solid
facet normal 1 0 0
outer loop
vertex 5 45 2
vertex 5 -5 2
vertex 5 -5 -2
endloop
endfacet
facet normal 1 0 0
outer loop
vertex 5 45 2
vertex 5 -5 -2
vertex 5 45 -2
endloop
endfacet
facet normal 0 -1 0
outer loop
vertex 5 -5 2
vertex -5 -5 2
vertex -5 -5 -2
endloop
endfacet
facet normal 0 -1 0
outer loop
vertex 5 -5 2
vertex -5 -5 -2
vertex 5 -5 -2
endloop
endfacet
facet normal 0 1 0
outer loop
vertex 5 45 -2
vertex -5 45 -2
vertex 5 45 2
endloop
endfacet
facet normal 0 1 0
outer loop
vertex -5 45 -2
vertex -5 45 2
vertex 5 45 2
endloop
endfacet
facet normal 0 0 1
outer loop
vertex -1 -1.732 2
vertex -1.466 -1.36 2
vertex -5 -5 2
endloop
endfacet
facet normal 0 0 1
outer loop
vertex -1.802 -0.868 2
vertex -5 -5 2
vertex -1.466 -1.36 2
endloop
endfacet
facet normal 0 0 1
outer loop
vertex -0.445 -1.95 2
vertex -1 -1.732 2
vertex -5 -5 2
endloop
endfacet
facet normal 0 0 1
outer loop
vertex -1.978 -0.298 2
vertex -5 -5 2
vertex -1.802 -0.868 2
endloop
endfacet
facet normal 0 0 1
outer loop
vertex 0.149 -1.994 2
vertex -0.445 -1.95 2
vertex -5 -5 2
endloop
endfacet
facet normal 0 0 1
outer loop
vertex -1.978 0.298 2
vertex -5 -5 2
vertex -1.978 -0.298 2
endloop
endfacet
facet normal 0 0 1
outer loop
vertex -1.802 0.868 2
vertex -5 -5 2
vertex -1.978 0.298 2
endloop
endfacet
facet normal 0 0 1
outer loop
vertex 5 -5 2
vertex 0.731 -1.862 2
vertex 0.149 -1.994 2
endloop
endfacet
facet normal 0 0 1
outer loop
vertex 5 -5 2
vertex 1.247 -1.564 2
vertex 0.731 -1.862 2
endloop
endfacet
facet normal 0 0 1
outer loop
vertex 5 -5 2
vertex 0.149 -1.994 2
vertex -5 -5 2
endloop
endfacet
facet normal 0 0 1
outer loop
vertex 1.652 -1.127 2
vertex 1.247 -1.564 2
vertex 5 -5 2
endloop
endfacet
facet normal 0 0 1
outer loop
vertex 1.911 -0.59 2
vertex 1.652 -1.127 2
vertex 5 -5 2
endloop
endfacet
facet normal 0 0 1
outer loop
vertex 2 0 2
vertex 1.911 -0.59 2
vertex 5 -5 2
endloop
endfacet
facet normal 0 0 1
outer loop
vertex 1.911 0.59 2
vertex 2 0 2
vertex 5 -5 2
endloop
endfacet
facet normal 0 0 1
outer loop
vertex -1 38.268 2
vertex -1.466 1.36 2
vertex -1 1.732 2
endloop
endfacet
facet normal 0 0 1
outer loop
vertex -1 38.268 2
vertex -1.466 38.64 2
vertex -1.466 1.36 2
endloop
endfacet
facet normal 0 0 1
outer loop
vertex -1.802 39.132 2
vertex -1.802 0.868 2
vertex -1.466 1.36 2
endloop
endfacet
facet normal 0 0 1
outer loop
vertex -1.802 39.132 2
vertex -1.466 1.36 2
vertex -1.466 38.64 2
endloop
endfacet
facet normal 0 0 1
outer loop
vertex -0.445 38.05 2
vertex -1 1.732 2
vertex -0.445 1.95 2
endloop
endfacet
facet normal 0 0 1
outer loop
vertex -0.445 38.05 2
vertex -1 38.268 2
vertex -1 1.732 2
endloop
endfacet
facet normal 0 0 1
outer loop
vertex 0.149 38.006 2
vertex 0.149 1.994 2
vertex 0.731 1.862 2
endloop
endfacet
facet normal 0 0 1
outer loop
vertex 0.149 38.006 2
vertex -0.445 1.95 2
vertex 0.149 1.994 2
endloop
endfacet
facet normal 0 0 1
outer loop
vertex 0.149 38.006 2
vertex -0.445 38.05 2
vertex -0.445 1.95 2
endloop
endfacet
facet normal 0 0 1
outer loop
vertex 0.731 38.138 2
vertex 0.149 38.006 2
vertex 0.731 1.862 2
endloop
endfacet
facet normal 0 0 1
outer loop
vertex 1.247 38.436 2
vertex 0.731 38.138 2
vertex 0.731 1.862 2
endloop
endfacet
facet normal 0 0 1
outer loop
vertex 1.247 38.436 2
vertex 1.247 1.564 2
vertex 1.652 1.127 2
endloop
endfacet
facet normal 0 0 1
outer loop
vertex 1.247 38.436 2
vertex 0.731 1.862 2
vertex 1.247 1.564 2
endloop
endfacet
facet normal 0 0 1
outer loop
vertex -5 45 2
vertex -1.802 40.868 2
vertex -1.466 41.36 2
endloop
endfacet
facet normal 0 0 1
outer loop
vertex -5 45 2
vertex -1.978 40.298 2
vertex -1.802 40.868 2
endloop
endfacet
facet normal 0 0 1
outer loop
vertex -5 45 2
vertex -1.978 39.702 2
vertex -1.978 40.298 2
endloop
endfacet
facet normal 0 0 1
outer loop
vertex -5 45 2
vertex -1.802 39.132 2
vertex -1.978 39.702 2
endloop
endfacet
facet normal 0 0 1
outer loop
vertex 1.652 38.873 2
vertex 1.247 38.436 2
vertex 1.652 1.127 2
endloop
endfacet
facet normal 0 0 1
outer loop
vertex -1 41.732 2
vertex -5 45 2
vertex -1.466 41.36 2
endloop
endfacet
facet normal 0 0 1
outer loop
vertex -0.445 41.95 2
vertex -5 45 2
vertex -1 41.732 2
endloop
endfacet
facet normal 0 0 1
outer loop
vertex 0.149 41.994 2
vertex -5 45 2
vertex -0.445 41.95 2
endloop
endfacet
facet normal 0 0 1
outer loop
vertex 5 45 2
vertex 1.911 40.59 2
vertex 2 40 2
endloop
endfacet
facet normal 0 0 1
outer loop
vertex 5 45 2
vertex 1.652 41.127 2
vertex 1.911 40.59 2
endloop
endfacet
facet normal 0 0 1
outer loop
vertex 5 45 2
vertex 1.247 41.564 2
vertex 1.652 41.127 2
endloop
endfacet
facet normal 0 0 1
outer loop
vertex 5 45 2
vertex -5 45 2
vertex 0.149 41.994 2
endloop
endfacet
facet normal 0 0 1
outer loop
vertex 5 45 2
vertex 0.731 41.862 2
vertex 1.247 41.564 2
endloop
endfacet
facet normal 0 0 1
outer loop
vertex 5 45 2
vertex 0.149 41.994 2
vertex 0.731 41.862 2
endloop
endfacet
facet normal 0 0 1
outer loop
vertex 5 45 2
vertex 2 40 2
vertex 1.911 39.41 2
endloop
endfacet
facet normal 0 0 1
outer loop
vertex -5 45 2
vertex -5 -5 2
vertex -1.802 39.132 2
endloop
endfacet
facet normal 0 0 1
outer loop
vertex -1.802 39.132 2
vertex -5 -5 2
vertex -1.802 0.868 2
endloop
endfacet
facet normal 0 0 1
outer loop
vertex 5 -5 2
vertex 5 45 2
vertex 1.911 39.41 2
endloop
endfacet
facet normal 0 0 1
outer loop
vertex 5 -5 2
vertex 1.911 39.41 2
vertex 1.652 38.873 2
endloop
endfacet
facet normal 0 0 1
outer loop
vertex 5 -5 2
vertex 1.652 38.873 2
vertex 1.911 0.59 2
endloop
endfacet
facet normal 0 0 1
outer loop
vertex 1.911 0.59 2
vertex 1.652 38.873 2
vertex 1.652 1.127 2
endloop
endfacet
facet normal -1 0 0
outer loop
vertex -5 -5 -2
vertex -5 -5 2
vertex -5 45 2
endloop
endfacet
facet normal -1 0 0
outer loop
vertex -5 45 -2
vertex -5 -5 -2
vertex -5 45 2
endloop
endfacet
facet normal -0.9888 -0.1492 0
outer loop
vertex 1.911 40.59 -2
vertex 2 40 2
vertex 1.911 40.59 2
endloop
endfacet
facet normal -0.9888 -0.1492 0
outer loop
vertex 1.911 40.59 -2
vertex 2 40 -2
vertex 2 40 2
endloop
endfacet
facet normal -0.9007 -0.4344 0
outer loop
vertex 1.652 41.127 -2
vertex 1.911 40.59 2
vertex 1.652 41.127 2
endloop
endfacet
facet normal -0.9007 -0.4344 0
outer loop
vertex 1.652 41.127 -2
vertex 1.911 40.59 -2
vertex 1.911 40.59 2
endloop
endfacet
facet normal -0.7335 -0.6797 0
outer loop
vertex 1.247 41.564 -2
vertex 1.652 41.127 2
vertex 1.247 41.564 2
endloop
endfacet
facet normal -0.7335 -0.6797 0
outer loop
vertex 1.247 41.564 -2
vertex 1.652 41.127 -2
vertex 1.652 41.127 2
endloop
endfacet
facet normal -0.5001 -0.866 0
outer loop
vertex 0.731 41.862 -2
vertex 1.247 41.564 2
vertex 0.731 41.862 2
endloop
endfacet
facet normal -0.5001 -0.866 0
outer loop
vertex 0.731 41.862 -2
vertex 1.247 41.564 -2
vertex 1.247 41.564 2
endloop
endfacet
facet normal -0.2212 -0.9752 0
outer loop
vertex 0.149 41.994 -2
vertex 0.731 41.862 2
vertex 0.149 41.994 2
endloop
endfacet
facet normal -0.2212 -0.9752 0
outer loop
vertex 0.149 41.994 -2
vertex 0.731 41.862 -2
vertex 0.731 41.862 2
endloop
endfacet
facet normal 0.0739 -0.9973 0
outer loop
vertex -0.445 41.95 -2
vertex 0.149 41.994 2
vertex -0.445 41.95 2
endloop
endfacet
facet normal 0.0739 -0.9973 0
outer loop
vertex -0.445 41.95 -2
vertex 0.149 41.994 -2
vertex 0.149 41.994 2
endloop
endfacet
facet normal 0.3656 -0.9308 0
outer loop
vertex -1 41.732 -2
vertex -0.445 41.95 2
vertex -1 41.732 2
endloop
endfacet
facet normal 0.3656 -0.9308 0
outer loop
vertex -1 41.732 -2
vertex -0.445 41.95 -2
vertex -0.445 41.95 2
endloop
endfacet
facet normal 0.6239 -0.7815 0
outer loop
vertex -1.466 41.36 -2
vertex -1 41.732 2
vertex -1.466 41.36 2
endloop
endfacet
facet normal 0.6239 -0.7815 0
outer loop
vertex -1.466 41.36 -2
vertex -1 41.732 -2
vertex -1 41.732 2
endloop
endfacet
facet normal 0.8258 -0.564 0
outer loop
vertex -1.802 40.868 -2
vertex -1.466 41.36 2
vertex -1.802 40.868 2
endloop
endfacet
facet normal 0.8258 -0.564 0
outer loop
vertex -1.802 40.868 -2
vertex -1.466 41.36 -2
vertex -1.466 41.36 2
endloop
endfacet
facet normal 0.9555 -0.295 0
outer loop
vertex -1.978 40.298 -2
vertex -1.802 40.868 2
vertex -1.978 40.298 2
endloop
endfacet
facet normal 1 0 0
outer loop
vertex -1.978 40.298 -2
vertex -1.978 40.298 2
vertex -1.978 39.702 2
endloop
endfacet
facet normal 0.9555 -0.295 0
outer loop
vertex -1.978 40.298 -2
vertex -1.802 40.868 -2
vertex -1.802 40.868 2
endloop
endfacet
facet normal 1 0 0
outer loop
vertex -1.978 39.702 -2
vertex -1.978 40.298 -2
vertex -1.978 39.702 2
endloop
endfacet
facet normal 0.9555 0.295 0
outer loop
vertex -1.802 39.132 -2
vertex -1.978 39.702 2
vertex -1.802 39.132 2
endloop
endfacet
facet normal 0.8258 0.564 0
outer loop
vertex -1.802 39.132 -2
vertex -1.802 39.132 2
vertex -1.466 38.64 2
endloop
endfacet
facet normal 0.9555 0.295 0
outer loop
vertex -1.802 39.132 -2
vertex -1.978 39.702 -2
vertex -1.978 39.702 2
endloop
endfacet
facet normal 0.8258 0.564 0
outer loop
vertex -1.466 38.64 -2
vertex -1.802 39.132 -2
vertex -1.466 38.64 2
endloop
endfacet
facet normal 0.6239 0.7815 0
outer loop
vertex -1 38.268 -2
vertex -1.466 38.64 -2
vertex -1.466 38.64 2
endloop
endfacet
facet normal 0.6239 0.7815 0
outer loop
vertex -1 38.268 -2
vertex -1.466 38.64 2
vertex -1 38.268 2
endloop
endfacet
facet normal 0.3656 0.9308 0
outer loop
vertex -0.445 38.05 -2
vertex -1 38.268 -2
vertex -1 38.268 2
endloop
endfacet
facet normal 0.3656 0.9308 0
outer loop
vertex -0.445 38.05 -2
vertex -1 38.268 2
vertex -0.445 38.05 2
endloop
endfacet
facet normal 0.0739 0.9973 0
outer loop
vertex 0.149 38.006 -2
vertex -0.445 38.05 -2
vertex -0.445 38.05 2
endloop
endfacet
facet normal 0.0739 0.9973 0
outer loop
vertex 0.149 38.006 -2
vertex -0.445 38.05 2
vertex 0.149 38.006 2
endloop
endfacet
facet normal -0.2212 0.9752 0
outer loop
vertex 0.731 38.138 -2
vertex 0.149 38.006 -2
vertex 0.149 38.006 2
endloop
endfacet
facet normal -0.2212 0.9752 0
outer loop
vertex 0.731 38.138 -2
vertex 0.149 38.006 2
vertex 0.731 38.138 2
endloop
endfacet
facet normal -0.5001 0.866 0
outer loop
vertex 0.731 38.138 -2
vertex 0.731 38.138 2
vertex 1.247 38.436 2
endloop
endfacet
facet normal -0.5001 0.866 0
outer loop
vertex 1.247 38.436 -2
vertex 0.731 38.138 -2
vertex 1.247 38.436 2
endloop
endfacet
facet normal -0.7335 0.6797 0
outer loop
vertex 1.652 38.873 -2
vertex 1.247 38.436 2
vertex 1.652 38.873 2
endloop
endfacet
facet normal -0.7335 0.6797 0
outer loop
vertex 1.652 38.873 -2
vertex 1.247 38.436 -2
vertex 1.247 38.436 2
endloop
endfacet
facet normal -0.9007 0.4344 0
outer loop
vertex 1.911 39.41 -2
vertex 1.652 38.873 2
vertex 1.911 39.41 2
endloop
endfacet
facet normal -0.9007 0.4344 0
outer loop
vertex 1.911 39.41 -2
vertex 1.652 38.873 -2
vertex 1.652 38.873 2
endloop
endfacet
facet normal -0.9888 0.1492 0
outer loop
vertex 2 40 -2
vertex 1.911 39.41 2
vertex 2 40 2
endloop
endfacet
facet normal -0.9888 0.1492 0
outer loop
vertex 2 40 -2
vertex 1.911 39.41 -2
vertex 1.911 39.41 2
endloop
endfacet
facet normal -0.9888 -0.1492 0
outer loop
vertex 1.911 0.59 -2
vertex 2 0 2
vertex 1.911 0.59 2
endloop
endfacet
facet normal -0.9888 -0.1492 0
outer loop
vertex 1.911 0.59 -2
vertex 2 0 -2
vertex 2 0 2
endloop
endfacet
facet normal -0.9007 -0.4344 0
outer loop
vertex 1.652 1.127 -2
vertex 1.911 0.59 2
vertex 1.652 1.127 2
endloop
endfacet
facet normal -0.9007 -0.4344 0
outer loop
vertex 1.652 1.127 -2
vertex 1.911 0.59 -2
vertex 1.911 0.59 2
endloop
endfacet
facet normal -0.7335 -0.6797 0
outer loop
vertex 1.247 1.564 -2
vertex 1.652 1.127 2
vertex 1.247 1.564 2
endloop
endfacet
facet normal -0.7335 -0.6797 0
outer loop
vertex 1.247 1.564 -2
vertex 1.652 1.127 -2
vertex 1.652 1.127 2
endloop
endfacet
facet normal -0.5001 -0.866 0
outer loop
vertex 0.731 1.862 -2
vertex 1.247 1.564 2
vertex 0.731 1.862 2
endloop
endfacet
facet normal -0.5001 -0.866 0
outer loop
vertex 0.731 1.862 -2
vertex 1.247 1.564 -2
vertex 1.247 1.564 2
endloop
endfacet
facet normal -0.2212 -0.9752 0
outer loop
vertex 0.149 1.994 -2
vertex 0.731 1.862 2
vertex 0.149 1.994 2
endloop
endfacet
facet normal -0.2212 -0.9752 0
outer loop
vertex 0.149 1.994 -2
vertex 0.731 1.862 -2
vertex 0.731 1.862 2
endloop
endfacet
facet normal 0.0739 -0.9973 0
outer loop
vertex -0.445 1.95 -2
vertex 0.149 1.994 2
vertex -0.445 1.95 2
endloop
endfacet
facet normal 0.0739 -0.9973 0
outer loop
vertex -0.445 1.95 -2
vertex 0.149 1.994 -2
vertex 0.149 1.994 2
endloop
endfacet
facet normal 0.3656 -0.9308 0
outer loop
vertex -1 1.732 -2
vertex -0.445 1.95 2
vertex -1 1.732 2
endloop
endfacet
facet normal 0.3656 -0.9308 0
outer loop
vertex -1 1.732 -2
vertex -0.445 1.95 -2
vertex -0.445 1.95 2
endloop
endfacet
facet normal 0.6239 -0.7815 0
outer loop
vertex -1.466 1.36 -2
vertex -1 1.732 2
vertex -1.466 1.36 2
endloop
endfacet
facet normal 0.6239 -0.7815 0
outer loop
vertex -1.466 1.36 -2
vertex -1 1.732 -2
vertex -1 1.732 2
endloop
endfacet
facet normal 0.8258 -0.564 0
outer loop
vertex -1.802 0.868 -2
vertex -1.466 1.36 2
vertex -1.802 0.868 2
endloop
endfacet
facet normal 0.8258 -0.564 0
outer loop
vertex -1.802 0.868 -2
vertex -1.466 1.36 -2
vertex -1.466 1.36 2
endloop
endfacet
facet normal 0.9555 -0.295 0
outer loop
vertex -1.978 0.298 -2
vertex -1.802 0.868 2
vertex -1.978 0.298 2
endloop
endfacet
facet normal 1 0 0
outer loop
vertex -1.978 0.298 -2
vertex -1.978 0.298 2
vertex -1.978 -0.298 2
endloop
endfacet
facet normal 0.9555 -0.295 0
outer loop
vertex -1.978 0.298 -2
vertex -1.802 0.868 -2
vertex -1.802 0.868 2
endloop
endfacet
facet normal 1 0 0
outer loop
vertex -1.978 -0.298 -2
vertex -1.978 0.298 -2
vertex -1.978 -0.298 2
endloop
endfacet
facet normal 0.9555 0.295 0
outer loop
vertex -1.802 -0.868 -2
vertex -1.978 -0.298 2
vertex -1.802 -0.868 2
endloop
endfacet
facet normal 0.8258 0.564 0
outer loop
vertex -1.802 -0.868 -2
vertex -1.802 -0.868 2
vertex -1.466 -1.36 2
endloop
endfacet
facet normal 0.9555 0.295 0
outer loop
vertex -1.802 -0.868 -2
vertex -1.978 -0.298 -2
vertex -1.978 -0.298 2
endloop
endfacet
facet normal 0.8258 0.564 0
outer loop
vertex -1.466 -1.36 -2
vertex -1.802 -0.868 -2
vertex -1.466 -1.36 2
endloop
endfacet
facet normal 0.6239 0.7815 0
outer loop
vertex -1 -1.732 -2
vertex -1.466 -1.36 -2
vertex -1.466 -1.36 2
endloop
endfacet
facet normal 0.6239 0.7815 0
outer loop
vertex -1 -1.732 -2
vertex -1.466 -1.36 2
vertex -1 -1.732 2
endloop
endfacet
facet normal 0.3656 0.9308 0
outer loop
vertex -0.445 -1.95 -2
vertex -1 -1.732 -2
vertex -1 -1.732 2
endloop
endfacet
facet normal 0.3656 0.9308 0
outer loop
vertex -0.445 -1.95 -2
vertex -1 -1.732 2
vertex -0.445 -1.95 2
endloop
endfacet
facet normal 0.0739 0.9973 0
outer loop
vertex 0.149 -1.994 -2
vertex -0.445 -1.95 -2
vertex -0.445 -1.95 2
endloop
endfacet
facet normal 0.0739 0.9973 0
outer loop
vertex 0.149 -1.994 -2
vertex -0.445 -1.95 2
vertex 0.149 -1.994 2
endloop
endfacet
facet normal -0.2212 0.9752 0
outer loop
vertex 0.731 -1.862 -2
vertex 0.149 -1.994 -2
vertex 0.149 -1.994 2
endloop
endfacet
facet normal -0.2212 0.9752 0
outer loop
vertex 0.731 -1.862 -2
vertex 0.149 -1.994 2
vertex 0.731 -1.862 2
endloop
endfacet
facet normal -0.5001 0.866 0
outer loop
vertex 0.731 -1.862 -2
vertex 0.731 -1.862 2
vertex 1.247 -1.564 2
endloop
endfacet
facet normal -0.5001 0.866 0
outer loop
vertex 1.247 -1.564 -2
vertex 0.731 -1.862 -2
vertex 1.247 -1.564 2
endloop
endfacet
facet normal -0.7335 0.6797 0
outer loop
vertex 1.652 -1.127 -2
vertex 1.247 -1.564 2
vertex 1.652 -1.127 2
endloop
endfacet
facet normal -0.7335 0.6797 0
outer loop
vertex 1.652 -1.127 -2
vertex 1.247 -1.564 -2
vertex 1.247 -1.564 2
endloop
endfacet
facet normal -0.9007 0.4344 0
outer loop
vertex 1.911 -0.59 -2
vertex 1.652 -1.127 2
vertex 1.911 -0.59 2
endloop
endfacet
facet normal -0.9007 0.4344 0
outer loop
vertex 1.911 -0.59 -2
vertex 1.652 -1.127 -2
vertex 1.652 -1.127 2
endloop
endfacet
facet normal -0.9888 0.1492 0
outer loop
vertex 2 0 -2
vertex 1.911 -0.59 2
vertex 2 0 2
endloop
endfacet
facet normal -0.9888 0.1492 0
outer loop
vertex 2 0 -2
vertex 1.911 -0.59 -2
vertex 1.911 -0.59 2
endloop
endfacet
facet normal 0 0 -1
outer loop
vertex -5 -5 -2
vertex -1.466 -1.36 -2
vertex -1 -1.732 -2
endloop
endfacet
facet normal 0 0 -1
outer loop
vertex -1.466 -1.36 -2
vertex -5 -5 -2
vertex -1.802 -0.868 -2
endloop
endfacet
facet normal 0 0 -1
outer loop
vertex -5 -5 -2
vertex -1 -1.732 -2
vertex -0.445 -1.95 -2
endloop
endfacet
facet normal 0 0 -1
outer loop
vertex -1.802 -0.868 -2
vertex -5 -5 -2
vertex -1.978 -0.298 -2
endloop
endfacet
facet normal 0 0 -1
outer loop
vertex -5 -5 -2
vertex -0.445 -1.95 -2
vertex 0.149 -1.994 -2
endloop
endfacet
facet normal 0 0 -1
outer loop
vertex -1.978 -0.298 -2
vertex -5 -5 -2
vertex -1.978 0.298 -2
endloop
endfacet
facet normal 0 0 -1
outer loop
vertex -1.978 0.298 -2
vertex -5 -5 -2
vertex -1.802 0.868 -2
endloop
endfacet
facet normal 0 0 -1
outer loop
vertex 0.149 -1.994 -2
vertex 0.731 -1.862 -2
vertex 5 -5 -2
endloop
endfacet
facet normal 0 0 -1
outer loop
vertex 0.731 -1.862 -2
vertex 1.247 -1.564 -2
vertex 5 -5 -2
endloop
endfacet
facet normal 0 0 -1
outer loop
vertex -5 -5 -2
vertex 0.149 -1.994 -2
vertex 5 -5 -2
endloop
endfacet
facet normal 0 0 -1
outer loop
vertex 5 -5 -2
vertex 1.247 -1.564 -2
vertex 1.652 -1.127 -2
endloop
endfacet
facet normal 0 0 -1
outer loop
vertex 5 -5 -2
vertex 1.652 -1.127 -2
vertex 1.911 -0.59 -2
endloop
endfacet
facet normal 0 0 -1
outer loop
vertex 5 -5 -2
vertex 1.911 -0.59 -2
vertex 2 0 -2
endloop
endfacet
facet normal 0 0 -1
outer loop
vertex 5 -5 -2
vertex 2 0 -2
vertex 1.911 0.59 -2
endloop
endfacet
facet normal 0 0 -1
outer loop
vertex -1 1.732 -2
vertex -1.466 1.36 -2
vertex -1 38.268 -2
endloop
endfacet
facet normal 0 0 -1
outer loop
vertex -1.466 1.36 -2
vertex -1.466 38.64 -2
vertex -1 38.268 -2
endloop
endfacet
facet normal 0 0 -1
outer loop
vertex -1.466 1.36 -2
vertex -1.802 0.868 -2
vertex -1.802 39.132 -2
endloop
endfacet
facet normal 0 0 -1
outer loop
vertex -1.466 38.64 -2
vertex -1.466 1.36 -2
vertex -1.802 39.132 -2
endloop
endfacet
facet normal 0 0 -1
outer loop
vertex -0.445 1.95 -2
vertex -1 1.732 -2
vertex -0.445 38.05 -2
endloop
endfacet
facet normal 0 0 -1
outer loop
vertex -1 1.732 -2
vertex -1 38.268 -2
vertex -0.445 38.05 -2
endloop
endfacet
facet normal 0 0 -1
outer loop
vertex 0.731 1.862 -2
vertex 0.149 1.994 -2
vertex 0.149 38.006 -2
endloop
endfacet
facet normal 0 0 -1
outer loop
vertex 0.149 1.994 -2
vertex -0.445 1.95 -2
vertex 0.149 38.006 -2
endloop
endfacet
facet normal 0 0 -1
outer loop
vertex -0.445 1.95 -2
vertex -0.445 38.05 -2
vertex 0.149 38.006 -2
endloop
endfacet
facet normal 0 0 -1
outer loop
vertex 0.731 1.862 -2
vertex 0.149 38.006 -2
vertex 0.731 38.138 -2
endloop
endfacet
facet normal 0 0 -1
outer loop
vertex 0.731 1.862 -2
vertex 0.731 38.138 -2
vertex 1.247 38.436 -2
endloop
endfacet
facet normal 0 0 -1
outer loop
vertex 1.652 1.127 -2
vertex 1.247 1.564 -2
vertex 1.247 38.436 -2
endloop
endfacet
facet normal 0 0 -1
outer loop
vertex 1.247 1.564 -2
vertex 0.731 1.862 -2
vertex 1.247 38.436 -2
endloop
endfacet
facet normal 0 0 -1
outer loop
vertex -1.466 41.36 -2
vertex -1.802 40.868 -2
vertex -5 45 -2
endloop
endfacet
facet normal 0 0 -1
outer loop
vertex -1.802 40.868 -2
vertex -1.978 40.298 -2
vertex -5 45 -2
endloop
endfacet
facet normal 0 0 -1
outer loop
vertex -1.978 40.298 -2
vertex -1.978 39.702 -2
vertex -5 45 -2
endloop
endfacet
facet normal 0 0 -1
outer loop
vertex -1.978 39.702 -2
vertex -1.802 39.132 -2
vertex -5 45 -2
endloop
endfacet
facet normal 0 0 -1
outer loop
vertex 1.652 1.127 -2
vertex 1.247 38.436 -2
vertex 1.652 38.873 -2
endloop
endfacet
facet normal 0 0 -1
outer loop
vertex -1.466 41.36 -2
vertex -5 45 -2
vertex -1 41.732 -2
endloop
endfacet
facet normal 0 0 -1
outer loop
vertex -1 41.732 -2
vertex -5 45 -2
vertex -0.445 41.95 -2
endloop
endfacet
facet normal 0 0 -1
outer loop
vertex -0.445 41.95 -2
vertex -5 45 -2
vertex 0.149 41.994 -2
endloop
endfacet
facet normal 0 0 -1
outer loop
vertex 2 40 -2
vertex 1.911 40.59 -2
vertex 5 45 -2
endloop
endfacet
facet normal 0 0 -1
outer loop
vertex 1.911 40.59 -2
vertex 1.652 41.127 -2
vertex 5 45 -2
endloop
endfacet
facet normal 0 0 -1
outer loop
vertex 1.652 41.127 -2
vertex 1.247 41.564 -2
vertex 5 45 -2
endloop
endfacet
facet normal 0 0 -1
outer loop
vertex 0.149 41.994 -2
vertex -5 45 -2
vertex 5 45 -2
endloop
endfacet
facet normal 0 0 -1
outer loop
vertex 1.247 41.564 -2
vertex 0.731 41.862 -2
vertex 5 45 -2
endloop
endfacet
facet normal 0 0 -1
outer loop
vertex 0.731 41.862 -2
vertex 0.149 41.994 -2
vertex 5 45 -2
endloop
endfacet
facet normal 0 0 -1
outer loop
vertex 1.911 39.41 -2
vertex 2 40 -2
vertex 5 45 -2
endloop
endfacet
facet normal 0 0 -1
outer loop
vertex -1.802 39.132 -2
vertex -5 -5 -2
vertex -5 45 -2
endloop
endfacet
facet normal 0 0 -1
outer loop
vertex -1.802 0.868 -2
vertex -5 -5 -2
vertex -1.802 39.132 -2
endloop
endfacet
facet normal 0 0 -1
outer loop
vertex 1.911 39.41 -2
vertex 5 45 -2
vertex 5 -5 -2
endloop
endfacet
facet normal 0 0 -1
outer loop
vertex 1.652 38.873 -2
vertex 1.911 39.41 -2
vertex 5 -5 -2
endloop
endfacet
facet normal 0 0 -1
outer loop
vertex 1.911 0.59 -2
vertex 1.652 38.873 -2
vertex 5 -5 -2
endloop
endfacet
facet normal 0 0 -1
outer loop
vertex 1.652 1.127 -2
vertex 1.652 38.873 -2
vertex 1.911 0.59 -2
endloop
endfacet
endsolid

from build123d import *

# Parameters (mm, degrees)
F0_W     = 10
F0_H     = 50
F0_R     = 2
F1_DEPTH = 2


with BuildPart() as f1:
    # F0 (on Top) → F1 (new body, symmetric)
    with BuildSketch(Plane.XY):
        with Locations((0, 20)):
            Rectangle(F0_W, F0_H)
        Circle(F0_R, mode=Mode.SUBTRACT)
        with Locations((0, 40)):
            Circle(F0_R, mode=Mode.SUBTRACT)
    extrude(amount=F1_DEPTH, both=True)


solid = f1.part
